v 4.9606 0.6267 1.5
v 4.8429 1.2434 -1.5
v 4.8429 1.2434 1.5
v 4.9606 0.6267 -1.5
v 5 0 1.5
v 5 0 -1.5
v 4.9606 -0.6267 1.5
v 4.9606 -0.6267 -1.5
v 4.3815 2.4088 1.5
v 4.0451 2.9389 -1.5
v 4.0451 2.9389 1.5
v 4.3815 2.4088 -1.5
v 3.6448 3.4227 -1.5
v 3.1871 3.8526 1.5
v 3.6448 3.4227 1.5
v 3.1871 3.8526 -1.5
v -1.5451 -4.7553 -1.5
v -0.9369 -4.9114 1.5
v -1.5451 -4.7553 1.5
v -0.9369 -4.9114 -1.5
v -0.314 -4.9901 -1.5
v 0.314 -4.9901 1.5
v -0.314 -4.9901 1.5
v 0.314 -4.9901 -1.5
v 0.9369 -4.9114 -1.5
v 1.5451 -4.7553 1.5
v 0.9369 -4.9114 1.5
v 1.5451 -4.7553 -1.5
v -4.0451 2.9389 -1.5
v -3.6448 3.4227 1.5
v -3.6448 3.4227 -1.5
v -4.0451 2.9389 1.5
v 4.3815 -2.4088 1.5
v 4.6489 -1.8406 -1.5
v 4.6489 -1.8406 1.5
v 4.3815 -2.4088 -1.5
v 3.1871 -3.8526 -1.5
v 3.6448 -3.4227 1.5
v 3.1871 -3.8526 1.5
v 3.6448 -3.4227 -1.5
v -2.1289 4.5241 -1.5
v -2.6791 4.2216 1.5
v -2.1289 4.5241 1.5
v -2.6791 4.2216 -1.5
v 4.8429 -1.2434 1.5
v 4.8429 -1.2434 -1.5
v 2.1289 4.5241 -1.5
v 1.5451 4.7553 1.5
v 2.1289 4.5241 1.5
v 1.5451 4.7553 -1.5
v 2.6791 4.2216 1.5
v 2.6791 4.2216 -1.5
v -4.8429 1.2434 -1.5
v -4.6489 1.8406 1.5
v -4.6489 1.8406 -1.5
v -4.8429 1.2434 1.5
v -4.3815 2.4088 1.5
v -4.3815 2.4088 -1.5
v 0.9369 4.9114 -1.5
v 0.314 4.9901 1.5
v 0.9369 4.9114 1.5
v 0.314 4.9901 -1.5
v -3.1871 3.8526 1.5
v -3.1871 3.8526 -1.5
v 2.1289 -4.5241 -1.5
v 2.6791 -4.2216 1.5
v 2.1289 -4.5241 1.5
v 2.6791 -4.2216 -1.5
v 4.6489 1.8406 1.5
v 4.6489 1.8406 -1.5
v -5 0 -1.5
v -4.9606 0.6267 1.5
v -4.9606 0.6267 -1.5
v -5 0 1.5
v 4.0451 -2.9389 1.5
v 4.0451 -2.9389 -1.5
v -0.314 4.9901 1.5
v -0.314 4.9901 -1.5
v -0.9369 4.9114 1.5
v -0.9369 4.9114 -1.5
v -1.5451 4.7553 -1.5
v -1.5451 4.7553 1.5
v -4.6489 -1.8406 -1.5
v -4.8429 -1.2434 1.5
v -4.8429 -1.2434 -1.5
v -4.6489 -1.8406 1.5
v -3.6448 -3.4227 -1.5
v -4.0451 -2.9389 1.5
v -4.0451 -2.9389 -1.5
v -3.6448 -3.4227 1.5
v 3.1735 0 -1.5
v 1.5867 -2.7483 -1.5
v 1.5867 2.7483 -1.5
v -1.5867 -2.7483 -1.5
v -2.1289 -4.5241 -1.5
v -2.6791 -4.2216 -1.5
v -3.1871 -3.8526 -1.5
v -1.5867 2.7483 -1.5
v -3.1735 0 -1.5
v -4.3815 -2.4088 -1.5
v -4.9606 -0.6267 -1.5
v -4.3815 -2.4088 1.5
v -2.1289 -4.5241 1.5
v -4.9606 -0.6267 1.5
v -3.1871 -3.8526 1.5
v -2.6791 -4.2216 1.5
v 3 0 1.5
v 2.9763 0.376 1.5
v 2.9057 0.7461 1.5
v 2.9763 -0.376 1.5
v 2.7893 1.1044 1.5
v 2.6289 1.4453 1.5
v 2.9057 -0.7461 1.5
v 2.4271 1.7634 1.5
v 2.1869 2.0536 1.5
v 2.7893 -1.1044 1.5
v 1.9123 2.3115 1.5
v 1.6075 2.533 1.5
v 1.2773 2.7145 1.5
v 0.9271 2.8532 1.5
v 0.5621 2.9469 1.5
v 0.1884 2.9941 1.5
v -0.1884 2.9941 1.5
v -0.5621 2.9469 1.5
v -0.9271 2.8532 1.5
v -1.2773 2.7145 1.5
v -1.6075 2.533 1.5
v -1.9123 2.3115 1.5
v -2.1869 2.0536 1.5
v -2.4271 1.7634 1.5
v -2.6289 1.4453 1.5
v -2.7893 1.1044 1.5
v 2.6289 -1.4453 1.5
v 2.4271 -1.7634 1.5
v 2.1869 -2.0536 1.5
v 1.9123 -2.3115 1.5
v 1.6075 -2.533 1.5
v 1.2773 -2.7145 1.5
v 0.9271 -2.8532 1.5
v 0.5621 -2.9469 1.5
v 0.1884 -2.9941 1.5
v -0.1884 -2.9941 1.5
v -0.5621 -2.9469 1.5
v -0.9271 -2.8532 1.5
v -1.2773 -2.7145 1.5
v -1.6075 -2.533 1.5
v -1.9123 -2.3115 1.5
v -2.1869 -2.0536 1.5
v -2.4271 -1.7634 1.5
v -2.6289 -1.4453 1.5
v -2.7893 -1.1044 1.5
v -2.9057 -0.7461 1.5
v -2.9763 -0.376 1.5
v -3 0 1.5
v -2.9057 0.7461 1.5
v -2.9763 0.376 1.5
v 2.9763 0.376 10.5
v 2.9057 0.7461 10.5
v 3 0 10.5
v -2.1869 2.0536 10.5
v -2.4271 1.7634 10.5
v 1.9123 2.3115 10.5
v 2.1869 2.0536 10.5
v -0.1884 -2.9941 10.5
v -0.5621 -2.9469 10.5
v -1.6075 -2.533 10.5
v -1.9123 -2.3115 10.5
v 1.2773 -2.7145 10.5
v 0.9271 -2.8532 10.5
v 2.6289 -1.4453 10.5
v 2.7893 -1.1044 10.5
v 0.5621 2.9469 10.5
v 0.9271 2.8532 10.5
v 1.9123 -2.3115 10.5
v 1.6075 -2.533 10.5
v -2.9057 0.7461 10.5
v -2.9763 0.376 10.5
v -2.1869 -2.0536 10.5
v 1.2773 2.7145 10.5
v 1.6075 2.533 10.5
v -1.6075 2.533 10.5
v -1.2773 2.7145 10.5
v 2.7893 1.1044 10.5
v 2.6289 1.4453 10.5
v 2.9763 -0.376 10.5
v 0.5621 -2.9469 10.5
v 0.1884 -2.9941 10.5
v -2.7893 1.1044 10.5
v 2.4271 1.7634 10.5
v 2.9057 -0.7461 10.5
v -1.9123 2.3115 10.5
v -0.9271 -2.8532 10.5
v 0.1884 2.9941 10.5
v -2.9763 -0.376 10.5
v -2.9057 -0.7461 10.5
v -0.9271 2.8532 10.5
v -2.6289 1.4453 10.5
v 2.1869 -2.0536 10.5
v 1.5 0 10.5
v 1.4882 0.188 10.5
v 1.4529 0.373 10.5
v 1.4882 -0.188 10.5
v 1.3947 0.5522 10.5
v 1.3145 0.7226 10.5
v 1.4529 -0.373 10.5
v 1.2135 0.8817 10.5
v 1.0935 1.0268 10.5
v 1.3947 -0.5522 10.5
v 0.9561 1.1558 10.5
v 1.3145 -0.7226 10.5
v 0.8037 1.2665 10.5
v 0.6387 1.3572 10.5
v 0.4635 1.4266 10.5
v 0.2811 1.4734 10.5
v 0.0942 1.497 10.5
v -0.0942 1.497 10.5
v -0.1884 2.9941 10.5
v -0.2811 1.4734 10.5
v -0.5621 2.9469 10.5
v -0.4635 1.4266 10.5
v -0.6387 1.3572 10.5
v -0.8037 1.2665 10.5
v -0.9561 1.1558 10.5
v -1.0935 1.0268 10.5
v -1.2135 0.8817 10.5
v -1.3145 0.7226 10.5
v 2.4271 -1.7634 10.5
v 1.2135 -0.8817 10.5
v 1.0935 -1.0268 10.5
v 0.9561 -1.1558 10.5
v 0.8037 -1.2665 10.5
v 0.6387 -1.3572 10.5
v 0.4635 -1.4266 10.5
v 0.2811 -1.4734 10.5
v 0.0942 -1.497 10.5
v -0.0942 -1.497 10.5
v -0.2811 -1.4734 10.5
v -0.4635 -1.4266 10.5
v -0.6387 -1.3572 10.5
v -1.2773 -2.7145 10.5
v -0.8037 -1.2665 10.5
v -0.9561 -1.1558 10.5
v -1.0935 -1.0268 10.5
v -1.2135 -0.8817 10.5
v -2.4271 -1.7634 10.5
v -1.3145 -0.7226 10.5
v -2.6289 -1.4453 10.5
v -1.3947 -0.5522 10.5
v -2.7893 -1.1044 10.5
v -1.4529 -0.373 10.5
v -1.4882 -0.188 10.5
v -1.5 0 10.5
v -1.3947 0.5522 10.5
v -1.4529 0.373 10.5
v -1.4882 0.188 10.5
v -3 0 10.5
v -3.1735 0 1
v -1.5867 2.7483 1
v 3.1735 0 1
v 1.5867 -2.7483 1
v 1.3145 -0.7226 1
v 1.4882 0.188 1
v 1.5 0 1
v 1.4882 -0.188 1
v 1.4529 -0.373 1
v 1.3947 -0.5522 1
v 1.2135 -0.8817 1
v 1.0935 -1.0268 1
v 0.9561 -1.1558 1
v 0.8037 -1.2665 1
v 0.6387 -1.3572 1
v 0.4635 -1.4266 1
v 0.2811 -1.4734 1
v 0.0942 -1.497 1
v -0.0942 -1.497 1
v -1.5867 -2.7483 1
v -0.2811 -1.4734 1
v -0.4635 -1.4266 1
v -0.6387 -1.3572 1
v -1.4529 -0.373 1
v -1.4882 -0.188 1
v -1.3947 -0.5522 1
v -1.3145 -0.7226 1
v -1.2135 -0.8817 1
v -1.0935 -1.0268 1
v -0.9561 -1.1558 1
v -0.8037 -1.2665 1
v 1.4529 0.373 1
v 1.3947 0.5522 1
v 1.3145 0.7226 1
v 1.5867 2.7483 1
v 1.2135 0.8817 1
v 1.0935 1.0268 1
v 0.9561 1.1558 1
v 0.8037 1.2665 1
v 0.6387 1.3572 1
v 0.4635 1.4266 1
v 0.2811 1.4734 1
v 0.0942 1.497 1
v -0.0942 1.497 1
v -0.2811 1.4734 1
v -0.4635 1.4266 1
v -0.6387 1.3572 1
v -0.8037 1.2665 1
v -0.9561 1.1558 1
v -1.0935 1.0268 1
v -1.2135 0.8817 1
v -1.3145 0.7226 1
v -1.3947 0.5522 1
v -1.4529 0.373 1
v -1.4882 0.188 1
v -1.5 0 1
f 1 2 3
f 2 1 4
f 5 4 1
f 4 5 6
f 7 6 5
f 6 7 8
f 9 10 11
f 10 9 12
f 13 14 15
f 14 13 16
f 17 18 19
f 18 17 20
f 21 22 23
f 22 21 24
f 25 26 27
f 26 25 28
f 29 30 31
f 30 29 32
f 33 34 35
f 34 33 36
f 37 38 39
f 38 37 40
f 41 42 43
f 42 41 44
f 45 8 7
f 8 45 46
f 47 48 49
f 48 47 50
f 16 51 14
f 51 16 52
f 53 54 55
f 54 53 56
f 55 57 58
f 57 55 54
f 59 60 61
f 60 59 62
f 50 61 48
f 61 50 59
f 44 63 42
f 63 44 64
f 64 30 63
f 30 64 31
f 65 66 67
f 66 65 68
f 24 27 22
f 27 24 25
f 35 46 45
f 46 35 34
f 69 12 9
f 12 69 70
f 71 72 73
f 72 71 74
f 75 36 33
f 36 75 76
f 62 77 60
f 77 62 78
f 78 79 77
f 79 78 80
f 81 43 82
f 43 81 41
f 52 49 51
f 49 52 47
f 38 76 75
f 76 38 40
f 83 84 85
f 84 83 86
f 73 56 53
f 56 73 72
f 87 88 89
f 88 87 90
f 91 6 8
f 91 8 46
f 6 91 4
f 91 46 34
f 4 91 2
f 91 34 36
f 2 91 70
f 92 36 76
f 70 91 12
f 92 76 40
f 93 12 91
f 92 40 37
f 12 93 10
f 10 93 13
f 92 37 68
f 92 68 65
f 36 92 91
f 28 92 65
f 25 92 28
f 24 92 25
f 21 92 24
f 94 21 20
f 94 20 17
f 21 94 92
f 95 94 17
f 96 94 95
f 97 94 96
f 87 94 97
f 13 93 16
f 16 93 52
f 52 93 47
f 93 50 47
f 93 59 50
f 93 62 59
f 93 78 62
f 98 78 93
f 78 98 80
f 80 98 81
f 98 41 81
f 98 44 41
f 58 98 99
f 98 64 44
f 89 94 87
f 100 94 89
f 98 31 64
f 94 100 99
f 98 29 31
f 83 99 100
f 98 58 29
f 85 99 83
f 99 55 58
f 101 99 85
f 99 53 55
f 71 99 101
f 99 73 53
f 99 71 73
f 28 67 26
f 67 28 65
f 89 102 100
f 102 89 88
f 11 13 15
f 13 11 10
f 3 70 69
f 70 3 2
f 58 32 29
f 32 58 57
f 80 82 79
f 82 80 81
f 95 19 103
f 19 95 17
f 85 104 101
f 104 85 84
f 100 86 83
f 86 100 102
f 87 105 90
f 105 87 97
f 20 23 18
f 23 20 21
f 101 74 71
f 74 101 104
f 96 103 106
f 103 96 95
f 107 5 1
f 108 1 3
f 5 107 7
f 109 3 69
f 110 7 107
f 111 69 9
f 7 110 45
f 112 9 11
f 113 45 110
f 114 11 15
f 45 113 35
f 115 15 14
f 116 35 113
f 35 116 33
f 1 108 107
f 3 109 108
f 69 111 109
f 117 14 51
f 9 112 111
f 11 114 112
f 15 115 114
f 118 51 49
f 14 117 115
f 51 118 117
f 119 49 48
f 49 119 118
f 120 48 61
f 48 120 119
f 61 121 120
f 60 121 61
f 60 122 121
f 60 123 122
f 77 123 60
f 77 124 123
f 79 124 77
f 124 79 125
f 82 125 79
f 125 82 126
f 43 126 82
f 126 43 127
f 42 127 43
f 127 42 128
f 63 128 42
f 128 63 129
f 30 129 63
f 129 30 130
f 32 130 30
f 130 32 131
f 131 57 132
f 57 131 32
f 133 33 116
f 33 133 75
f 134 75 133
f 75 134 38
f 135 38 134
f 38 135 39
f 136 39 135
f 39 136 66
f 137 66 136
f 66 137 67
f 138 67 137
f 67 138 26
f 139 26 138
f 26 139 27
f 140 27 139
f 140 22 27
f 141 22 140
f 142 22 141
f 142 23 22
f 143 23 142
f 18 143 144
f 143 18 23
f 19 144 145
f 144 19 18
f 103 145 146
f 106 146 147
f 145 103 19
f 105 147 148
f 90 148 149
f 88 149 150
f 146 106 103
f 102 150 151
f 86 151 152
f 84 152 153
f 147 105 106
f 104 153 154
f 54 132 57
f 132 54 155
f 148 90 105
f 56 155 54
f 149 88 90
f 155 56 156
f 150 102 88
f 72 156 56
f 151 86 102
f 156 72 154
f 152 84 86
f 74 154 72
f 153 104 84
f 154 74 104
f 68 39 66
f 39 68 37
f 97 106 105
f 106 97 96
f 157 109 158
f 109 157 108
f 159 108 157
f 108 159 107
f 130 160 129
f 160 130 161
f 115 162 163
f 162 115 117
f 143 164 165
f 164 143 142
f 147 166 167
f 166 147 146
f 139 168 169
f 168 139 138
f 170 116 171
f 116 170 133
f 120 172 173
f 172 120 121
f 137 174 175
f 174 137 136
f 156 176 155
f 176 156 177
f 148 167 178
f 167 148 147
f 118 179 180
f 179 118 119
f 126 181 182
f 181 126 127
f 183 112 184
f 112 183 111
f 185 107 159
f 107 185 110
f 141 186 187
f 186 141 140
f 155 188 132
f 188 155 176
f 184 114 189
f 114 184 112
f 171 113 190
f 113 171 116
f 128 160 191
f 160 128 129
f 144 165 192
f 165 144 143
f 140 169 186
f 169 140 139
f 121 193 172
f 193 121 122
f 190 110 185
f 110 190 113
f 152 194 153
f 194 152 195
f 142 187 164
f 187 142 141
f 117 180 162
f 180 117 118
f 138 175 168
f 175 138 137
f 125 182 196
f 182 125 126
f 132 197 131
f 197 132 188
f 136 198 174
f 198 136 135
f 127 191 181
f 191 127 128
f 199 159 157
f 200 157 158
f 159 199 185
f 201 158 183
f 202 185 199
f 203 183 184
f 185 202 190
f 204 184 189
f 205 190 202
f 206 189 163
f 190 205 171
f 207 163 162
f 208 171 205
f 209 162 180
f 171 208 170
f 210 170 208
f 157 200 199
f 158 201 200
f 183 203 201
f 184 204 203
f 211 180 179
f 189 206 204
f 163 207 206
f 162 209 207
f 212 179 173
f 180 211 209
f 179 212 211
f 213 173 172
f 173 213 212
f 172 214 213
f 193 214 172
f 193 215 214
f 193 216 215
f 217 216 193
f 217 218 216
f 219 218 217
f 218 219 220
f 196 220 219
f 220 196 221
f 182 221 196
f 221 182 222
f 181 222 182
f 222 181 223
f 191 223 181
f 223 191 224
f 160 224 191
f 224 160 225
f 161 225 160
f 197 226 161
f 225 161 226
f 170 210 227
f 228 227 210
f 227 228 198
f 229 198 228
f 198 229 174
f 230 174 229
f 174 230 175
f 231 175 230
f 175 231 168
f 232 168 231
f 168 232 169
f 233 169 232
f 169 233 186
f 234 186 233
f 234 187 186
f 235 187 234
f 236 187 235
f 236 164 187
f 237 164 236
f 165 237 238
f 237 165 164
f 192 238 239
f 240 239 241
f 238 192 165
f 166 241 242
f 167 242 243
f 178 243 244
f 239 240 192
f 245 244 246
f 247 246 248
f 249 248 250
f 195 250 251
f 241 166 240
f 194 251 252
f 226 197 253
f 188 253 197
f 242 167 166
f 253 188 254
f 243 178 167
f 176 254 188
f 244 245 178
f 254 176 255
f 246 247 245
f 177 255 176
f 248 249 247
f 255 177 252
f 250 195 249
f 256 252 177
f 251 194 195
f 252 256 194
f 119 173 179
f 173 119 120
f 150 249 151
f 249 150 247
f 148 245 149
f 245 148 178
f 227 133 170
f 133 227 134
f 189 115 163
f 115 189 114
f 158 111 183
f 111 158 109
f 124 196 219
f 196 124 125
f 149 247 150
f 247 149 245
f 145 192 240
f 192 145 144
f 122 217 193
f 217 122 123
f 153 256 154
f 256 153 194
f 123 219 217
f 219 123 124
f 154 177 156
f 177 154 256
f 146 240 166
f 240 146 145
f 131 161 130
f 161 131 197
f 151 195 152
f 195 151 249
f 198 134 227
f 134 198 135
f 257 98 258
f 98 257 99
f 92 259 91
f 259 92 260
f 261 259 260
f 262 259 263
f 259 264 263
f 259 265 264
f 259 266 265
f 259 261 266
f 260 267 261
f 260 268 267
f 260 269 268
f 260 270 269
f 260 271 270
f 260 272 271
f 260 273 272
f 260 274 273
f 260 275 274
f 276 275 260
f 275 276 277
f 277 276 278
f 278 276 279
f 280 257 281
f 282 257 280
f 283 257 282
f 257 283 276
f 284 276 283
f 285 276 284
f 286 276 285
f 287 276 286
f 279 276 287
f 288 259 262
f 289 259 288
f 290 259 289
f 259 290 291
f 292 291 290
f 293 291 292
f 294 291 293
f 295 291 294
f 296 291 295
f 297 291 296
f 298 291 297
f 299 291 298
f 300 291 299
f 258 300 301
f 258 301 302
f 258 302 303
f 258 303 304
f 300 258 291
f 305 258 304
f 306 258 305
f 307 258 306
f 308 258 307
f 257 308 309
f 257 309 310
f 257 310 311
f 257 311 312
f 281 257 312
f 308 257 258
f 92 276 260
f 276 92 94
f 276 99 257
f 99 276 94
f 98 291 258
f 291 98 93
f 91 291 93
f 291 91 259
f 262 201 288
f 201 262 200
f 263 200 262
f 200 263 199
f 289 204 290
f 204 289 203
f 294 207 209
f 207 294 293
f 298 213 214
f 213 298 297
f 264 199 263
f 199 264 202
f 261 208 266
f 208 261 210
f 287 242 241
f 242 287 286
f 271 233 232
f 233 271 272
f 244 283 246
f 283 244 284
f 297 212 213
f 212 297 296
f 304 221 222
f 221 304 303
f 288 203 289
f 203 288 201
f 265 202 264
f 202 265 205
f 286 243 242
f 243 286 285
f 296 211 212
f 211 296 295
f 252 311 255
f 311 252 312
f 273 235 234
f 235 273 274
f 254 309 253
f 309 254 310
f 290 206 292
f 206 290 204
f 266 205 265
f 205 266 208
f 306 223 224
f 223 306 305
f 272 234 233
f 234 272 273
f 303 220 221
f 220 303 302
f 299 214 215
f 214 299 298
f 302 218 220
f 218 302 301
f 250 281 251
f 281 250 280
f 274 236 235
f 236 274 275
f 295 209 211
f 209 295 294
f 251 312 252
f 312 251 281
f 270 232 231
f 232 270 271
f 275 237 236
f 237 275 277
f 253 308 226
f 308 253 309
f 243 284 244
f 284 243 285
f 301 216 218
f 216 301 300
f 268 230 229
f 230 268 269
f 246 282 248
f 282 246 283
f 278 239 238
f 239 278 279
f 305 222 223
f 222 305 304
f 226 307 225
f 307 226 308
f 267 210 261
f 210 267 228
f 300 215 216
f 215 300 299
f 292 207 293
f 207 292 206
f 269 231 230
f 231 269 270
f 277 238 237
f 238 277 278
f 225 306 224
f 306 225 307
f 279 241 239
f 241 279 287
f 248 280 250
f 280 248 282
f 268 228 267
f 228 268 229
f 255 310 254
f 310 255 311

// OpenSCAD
$fn = 50;


difference() {
	union() {
		translate(v = [0, 0, -1.5000000000]) {
			cylinder(h = 3, r = 5.0000000000);
		}
		translate(v = [0, 0, -1.5000000000]) {
			cylinder(h = 12, r = 3.0000000000);
		}
	}
	union() {
		translate(v = [0, 0, -1.5000000000]) {
			rotate(a = [0, 0, 0]) {
				difference() {
					union() {
						linear_extrude(height = 2.5000000000) {
							polygon(points = [[3.1735000000, 0.0000000000], [1.5867500000, 2.7483316189], [-1.5867500000, 2.7483316189], [-3.1735000000, 0.0000000000], [-1.5867500000, -2.7483316189], [1.5867500000, -2.7483316189]]);
						}
					}
					union();
				}
			}
		}
		translate(v = [0, 0, -100.0000000000]) {
			cylinder(h = 200, r = 1.5000000000);
		}
	}
}
